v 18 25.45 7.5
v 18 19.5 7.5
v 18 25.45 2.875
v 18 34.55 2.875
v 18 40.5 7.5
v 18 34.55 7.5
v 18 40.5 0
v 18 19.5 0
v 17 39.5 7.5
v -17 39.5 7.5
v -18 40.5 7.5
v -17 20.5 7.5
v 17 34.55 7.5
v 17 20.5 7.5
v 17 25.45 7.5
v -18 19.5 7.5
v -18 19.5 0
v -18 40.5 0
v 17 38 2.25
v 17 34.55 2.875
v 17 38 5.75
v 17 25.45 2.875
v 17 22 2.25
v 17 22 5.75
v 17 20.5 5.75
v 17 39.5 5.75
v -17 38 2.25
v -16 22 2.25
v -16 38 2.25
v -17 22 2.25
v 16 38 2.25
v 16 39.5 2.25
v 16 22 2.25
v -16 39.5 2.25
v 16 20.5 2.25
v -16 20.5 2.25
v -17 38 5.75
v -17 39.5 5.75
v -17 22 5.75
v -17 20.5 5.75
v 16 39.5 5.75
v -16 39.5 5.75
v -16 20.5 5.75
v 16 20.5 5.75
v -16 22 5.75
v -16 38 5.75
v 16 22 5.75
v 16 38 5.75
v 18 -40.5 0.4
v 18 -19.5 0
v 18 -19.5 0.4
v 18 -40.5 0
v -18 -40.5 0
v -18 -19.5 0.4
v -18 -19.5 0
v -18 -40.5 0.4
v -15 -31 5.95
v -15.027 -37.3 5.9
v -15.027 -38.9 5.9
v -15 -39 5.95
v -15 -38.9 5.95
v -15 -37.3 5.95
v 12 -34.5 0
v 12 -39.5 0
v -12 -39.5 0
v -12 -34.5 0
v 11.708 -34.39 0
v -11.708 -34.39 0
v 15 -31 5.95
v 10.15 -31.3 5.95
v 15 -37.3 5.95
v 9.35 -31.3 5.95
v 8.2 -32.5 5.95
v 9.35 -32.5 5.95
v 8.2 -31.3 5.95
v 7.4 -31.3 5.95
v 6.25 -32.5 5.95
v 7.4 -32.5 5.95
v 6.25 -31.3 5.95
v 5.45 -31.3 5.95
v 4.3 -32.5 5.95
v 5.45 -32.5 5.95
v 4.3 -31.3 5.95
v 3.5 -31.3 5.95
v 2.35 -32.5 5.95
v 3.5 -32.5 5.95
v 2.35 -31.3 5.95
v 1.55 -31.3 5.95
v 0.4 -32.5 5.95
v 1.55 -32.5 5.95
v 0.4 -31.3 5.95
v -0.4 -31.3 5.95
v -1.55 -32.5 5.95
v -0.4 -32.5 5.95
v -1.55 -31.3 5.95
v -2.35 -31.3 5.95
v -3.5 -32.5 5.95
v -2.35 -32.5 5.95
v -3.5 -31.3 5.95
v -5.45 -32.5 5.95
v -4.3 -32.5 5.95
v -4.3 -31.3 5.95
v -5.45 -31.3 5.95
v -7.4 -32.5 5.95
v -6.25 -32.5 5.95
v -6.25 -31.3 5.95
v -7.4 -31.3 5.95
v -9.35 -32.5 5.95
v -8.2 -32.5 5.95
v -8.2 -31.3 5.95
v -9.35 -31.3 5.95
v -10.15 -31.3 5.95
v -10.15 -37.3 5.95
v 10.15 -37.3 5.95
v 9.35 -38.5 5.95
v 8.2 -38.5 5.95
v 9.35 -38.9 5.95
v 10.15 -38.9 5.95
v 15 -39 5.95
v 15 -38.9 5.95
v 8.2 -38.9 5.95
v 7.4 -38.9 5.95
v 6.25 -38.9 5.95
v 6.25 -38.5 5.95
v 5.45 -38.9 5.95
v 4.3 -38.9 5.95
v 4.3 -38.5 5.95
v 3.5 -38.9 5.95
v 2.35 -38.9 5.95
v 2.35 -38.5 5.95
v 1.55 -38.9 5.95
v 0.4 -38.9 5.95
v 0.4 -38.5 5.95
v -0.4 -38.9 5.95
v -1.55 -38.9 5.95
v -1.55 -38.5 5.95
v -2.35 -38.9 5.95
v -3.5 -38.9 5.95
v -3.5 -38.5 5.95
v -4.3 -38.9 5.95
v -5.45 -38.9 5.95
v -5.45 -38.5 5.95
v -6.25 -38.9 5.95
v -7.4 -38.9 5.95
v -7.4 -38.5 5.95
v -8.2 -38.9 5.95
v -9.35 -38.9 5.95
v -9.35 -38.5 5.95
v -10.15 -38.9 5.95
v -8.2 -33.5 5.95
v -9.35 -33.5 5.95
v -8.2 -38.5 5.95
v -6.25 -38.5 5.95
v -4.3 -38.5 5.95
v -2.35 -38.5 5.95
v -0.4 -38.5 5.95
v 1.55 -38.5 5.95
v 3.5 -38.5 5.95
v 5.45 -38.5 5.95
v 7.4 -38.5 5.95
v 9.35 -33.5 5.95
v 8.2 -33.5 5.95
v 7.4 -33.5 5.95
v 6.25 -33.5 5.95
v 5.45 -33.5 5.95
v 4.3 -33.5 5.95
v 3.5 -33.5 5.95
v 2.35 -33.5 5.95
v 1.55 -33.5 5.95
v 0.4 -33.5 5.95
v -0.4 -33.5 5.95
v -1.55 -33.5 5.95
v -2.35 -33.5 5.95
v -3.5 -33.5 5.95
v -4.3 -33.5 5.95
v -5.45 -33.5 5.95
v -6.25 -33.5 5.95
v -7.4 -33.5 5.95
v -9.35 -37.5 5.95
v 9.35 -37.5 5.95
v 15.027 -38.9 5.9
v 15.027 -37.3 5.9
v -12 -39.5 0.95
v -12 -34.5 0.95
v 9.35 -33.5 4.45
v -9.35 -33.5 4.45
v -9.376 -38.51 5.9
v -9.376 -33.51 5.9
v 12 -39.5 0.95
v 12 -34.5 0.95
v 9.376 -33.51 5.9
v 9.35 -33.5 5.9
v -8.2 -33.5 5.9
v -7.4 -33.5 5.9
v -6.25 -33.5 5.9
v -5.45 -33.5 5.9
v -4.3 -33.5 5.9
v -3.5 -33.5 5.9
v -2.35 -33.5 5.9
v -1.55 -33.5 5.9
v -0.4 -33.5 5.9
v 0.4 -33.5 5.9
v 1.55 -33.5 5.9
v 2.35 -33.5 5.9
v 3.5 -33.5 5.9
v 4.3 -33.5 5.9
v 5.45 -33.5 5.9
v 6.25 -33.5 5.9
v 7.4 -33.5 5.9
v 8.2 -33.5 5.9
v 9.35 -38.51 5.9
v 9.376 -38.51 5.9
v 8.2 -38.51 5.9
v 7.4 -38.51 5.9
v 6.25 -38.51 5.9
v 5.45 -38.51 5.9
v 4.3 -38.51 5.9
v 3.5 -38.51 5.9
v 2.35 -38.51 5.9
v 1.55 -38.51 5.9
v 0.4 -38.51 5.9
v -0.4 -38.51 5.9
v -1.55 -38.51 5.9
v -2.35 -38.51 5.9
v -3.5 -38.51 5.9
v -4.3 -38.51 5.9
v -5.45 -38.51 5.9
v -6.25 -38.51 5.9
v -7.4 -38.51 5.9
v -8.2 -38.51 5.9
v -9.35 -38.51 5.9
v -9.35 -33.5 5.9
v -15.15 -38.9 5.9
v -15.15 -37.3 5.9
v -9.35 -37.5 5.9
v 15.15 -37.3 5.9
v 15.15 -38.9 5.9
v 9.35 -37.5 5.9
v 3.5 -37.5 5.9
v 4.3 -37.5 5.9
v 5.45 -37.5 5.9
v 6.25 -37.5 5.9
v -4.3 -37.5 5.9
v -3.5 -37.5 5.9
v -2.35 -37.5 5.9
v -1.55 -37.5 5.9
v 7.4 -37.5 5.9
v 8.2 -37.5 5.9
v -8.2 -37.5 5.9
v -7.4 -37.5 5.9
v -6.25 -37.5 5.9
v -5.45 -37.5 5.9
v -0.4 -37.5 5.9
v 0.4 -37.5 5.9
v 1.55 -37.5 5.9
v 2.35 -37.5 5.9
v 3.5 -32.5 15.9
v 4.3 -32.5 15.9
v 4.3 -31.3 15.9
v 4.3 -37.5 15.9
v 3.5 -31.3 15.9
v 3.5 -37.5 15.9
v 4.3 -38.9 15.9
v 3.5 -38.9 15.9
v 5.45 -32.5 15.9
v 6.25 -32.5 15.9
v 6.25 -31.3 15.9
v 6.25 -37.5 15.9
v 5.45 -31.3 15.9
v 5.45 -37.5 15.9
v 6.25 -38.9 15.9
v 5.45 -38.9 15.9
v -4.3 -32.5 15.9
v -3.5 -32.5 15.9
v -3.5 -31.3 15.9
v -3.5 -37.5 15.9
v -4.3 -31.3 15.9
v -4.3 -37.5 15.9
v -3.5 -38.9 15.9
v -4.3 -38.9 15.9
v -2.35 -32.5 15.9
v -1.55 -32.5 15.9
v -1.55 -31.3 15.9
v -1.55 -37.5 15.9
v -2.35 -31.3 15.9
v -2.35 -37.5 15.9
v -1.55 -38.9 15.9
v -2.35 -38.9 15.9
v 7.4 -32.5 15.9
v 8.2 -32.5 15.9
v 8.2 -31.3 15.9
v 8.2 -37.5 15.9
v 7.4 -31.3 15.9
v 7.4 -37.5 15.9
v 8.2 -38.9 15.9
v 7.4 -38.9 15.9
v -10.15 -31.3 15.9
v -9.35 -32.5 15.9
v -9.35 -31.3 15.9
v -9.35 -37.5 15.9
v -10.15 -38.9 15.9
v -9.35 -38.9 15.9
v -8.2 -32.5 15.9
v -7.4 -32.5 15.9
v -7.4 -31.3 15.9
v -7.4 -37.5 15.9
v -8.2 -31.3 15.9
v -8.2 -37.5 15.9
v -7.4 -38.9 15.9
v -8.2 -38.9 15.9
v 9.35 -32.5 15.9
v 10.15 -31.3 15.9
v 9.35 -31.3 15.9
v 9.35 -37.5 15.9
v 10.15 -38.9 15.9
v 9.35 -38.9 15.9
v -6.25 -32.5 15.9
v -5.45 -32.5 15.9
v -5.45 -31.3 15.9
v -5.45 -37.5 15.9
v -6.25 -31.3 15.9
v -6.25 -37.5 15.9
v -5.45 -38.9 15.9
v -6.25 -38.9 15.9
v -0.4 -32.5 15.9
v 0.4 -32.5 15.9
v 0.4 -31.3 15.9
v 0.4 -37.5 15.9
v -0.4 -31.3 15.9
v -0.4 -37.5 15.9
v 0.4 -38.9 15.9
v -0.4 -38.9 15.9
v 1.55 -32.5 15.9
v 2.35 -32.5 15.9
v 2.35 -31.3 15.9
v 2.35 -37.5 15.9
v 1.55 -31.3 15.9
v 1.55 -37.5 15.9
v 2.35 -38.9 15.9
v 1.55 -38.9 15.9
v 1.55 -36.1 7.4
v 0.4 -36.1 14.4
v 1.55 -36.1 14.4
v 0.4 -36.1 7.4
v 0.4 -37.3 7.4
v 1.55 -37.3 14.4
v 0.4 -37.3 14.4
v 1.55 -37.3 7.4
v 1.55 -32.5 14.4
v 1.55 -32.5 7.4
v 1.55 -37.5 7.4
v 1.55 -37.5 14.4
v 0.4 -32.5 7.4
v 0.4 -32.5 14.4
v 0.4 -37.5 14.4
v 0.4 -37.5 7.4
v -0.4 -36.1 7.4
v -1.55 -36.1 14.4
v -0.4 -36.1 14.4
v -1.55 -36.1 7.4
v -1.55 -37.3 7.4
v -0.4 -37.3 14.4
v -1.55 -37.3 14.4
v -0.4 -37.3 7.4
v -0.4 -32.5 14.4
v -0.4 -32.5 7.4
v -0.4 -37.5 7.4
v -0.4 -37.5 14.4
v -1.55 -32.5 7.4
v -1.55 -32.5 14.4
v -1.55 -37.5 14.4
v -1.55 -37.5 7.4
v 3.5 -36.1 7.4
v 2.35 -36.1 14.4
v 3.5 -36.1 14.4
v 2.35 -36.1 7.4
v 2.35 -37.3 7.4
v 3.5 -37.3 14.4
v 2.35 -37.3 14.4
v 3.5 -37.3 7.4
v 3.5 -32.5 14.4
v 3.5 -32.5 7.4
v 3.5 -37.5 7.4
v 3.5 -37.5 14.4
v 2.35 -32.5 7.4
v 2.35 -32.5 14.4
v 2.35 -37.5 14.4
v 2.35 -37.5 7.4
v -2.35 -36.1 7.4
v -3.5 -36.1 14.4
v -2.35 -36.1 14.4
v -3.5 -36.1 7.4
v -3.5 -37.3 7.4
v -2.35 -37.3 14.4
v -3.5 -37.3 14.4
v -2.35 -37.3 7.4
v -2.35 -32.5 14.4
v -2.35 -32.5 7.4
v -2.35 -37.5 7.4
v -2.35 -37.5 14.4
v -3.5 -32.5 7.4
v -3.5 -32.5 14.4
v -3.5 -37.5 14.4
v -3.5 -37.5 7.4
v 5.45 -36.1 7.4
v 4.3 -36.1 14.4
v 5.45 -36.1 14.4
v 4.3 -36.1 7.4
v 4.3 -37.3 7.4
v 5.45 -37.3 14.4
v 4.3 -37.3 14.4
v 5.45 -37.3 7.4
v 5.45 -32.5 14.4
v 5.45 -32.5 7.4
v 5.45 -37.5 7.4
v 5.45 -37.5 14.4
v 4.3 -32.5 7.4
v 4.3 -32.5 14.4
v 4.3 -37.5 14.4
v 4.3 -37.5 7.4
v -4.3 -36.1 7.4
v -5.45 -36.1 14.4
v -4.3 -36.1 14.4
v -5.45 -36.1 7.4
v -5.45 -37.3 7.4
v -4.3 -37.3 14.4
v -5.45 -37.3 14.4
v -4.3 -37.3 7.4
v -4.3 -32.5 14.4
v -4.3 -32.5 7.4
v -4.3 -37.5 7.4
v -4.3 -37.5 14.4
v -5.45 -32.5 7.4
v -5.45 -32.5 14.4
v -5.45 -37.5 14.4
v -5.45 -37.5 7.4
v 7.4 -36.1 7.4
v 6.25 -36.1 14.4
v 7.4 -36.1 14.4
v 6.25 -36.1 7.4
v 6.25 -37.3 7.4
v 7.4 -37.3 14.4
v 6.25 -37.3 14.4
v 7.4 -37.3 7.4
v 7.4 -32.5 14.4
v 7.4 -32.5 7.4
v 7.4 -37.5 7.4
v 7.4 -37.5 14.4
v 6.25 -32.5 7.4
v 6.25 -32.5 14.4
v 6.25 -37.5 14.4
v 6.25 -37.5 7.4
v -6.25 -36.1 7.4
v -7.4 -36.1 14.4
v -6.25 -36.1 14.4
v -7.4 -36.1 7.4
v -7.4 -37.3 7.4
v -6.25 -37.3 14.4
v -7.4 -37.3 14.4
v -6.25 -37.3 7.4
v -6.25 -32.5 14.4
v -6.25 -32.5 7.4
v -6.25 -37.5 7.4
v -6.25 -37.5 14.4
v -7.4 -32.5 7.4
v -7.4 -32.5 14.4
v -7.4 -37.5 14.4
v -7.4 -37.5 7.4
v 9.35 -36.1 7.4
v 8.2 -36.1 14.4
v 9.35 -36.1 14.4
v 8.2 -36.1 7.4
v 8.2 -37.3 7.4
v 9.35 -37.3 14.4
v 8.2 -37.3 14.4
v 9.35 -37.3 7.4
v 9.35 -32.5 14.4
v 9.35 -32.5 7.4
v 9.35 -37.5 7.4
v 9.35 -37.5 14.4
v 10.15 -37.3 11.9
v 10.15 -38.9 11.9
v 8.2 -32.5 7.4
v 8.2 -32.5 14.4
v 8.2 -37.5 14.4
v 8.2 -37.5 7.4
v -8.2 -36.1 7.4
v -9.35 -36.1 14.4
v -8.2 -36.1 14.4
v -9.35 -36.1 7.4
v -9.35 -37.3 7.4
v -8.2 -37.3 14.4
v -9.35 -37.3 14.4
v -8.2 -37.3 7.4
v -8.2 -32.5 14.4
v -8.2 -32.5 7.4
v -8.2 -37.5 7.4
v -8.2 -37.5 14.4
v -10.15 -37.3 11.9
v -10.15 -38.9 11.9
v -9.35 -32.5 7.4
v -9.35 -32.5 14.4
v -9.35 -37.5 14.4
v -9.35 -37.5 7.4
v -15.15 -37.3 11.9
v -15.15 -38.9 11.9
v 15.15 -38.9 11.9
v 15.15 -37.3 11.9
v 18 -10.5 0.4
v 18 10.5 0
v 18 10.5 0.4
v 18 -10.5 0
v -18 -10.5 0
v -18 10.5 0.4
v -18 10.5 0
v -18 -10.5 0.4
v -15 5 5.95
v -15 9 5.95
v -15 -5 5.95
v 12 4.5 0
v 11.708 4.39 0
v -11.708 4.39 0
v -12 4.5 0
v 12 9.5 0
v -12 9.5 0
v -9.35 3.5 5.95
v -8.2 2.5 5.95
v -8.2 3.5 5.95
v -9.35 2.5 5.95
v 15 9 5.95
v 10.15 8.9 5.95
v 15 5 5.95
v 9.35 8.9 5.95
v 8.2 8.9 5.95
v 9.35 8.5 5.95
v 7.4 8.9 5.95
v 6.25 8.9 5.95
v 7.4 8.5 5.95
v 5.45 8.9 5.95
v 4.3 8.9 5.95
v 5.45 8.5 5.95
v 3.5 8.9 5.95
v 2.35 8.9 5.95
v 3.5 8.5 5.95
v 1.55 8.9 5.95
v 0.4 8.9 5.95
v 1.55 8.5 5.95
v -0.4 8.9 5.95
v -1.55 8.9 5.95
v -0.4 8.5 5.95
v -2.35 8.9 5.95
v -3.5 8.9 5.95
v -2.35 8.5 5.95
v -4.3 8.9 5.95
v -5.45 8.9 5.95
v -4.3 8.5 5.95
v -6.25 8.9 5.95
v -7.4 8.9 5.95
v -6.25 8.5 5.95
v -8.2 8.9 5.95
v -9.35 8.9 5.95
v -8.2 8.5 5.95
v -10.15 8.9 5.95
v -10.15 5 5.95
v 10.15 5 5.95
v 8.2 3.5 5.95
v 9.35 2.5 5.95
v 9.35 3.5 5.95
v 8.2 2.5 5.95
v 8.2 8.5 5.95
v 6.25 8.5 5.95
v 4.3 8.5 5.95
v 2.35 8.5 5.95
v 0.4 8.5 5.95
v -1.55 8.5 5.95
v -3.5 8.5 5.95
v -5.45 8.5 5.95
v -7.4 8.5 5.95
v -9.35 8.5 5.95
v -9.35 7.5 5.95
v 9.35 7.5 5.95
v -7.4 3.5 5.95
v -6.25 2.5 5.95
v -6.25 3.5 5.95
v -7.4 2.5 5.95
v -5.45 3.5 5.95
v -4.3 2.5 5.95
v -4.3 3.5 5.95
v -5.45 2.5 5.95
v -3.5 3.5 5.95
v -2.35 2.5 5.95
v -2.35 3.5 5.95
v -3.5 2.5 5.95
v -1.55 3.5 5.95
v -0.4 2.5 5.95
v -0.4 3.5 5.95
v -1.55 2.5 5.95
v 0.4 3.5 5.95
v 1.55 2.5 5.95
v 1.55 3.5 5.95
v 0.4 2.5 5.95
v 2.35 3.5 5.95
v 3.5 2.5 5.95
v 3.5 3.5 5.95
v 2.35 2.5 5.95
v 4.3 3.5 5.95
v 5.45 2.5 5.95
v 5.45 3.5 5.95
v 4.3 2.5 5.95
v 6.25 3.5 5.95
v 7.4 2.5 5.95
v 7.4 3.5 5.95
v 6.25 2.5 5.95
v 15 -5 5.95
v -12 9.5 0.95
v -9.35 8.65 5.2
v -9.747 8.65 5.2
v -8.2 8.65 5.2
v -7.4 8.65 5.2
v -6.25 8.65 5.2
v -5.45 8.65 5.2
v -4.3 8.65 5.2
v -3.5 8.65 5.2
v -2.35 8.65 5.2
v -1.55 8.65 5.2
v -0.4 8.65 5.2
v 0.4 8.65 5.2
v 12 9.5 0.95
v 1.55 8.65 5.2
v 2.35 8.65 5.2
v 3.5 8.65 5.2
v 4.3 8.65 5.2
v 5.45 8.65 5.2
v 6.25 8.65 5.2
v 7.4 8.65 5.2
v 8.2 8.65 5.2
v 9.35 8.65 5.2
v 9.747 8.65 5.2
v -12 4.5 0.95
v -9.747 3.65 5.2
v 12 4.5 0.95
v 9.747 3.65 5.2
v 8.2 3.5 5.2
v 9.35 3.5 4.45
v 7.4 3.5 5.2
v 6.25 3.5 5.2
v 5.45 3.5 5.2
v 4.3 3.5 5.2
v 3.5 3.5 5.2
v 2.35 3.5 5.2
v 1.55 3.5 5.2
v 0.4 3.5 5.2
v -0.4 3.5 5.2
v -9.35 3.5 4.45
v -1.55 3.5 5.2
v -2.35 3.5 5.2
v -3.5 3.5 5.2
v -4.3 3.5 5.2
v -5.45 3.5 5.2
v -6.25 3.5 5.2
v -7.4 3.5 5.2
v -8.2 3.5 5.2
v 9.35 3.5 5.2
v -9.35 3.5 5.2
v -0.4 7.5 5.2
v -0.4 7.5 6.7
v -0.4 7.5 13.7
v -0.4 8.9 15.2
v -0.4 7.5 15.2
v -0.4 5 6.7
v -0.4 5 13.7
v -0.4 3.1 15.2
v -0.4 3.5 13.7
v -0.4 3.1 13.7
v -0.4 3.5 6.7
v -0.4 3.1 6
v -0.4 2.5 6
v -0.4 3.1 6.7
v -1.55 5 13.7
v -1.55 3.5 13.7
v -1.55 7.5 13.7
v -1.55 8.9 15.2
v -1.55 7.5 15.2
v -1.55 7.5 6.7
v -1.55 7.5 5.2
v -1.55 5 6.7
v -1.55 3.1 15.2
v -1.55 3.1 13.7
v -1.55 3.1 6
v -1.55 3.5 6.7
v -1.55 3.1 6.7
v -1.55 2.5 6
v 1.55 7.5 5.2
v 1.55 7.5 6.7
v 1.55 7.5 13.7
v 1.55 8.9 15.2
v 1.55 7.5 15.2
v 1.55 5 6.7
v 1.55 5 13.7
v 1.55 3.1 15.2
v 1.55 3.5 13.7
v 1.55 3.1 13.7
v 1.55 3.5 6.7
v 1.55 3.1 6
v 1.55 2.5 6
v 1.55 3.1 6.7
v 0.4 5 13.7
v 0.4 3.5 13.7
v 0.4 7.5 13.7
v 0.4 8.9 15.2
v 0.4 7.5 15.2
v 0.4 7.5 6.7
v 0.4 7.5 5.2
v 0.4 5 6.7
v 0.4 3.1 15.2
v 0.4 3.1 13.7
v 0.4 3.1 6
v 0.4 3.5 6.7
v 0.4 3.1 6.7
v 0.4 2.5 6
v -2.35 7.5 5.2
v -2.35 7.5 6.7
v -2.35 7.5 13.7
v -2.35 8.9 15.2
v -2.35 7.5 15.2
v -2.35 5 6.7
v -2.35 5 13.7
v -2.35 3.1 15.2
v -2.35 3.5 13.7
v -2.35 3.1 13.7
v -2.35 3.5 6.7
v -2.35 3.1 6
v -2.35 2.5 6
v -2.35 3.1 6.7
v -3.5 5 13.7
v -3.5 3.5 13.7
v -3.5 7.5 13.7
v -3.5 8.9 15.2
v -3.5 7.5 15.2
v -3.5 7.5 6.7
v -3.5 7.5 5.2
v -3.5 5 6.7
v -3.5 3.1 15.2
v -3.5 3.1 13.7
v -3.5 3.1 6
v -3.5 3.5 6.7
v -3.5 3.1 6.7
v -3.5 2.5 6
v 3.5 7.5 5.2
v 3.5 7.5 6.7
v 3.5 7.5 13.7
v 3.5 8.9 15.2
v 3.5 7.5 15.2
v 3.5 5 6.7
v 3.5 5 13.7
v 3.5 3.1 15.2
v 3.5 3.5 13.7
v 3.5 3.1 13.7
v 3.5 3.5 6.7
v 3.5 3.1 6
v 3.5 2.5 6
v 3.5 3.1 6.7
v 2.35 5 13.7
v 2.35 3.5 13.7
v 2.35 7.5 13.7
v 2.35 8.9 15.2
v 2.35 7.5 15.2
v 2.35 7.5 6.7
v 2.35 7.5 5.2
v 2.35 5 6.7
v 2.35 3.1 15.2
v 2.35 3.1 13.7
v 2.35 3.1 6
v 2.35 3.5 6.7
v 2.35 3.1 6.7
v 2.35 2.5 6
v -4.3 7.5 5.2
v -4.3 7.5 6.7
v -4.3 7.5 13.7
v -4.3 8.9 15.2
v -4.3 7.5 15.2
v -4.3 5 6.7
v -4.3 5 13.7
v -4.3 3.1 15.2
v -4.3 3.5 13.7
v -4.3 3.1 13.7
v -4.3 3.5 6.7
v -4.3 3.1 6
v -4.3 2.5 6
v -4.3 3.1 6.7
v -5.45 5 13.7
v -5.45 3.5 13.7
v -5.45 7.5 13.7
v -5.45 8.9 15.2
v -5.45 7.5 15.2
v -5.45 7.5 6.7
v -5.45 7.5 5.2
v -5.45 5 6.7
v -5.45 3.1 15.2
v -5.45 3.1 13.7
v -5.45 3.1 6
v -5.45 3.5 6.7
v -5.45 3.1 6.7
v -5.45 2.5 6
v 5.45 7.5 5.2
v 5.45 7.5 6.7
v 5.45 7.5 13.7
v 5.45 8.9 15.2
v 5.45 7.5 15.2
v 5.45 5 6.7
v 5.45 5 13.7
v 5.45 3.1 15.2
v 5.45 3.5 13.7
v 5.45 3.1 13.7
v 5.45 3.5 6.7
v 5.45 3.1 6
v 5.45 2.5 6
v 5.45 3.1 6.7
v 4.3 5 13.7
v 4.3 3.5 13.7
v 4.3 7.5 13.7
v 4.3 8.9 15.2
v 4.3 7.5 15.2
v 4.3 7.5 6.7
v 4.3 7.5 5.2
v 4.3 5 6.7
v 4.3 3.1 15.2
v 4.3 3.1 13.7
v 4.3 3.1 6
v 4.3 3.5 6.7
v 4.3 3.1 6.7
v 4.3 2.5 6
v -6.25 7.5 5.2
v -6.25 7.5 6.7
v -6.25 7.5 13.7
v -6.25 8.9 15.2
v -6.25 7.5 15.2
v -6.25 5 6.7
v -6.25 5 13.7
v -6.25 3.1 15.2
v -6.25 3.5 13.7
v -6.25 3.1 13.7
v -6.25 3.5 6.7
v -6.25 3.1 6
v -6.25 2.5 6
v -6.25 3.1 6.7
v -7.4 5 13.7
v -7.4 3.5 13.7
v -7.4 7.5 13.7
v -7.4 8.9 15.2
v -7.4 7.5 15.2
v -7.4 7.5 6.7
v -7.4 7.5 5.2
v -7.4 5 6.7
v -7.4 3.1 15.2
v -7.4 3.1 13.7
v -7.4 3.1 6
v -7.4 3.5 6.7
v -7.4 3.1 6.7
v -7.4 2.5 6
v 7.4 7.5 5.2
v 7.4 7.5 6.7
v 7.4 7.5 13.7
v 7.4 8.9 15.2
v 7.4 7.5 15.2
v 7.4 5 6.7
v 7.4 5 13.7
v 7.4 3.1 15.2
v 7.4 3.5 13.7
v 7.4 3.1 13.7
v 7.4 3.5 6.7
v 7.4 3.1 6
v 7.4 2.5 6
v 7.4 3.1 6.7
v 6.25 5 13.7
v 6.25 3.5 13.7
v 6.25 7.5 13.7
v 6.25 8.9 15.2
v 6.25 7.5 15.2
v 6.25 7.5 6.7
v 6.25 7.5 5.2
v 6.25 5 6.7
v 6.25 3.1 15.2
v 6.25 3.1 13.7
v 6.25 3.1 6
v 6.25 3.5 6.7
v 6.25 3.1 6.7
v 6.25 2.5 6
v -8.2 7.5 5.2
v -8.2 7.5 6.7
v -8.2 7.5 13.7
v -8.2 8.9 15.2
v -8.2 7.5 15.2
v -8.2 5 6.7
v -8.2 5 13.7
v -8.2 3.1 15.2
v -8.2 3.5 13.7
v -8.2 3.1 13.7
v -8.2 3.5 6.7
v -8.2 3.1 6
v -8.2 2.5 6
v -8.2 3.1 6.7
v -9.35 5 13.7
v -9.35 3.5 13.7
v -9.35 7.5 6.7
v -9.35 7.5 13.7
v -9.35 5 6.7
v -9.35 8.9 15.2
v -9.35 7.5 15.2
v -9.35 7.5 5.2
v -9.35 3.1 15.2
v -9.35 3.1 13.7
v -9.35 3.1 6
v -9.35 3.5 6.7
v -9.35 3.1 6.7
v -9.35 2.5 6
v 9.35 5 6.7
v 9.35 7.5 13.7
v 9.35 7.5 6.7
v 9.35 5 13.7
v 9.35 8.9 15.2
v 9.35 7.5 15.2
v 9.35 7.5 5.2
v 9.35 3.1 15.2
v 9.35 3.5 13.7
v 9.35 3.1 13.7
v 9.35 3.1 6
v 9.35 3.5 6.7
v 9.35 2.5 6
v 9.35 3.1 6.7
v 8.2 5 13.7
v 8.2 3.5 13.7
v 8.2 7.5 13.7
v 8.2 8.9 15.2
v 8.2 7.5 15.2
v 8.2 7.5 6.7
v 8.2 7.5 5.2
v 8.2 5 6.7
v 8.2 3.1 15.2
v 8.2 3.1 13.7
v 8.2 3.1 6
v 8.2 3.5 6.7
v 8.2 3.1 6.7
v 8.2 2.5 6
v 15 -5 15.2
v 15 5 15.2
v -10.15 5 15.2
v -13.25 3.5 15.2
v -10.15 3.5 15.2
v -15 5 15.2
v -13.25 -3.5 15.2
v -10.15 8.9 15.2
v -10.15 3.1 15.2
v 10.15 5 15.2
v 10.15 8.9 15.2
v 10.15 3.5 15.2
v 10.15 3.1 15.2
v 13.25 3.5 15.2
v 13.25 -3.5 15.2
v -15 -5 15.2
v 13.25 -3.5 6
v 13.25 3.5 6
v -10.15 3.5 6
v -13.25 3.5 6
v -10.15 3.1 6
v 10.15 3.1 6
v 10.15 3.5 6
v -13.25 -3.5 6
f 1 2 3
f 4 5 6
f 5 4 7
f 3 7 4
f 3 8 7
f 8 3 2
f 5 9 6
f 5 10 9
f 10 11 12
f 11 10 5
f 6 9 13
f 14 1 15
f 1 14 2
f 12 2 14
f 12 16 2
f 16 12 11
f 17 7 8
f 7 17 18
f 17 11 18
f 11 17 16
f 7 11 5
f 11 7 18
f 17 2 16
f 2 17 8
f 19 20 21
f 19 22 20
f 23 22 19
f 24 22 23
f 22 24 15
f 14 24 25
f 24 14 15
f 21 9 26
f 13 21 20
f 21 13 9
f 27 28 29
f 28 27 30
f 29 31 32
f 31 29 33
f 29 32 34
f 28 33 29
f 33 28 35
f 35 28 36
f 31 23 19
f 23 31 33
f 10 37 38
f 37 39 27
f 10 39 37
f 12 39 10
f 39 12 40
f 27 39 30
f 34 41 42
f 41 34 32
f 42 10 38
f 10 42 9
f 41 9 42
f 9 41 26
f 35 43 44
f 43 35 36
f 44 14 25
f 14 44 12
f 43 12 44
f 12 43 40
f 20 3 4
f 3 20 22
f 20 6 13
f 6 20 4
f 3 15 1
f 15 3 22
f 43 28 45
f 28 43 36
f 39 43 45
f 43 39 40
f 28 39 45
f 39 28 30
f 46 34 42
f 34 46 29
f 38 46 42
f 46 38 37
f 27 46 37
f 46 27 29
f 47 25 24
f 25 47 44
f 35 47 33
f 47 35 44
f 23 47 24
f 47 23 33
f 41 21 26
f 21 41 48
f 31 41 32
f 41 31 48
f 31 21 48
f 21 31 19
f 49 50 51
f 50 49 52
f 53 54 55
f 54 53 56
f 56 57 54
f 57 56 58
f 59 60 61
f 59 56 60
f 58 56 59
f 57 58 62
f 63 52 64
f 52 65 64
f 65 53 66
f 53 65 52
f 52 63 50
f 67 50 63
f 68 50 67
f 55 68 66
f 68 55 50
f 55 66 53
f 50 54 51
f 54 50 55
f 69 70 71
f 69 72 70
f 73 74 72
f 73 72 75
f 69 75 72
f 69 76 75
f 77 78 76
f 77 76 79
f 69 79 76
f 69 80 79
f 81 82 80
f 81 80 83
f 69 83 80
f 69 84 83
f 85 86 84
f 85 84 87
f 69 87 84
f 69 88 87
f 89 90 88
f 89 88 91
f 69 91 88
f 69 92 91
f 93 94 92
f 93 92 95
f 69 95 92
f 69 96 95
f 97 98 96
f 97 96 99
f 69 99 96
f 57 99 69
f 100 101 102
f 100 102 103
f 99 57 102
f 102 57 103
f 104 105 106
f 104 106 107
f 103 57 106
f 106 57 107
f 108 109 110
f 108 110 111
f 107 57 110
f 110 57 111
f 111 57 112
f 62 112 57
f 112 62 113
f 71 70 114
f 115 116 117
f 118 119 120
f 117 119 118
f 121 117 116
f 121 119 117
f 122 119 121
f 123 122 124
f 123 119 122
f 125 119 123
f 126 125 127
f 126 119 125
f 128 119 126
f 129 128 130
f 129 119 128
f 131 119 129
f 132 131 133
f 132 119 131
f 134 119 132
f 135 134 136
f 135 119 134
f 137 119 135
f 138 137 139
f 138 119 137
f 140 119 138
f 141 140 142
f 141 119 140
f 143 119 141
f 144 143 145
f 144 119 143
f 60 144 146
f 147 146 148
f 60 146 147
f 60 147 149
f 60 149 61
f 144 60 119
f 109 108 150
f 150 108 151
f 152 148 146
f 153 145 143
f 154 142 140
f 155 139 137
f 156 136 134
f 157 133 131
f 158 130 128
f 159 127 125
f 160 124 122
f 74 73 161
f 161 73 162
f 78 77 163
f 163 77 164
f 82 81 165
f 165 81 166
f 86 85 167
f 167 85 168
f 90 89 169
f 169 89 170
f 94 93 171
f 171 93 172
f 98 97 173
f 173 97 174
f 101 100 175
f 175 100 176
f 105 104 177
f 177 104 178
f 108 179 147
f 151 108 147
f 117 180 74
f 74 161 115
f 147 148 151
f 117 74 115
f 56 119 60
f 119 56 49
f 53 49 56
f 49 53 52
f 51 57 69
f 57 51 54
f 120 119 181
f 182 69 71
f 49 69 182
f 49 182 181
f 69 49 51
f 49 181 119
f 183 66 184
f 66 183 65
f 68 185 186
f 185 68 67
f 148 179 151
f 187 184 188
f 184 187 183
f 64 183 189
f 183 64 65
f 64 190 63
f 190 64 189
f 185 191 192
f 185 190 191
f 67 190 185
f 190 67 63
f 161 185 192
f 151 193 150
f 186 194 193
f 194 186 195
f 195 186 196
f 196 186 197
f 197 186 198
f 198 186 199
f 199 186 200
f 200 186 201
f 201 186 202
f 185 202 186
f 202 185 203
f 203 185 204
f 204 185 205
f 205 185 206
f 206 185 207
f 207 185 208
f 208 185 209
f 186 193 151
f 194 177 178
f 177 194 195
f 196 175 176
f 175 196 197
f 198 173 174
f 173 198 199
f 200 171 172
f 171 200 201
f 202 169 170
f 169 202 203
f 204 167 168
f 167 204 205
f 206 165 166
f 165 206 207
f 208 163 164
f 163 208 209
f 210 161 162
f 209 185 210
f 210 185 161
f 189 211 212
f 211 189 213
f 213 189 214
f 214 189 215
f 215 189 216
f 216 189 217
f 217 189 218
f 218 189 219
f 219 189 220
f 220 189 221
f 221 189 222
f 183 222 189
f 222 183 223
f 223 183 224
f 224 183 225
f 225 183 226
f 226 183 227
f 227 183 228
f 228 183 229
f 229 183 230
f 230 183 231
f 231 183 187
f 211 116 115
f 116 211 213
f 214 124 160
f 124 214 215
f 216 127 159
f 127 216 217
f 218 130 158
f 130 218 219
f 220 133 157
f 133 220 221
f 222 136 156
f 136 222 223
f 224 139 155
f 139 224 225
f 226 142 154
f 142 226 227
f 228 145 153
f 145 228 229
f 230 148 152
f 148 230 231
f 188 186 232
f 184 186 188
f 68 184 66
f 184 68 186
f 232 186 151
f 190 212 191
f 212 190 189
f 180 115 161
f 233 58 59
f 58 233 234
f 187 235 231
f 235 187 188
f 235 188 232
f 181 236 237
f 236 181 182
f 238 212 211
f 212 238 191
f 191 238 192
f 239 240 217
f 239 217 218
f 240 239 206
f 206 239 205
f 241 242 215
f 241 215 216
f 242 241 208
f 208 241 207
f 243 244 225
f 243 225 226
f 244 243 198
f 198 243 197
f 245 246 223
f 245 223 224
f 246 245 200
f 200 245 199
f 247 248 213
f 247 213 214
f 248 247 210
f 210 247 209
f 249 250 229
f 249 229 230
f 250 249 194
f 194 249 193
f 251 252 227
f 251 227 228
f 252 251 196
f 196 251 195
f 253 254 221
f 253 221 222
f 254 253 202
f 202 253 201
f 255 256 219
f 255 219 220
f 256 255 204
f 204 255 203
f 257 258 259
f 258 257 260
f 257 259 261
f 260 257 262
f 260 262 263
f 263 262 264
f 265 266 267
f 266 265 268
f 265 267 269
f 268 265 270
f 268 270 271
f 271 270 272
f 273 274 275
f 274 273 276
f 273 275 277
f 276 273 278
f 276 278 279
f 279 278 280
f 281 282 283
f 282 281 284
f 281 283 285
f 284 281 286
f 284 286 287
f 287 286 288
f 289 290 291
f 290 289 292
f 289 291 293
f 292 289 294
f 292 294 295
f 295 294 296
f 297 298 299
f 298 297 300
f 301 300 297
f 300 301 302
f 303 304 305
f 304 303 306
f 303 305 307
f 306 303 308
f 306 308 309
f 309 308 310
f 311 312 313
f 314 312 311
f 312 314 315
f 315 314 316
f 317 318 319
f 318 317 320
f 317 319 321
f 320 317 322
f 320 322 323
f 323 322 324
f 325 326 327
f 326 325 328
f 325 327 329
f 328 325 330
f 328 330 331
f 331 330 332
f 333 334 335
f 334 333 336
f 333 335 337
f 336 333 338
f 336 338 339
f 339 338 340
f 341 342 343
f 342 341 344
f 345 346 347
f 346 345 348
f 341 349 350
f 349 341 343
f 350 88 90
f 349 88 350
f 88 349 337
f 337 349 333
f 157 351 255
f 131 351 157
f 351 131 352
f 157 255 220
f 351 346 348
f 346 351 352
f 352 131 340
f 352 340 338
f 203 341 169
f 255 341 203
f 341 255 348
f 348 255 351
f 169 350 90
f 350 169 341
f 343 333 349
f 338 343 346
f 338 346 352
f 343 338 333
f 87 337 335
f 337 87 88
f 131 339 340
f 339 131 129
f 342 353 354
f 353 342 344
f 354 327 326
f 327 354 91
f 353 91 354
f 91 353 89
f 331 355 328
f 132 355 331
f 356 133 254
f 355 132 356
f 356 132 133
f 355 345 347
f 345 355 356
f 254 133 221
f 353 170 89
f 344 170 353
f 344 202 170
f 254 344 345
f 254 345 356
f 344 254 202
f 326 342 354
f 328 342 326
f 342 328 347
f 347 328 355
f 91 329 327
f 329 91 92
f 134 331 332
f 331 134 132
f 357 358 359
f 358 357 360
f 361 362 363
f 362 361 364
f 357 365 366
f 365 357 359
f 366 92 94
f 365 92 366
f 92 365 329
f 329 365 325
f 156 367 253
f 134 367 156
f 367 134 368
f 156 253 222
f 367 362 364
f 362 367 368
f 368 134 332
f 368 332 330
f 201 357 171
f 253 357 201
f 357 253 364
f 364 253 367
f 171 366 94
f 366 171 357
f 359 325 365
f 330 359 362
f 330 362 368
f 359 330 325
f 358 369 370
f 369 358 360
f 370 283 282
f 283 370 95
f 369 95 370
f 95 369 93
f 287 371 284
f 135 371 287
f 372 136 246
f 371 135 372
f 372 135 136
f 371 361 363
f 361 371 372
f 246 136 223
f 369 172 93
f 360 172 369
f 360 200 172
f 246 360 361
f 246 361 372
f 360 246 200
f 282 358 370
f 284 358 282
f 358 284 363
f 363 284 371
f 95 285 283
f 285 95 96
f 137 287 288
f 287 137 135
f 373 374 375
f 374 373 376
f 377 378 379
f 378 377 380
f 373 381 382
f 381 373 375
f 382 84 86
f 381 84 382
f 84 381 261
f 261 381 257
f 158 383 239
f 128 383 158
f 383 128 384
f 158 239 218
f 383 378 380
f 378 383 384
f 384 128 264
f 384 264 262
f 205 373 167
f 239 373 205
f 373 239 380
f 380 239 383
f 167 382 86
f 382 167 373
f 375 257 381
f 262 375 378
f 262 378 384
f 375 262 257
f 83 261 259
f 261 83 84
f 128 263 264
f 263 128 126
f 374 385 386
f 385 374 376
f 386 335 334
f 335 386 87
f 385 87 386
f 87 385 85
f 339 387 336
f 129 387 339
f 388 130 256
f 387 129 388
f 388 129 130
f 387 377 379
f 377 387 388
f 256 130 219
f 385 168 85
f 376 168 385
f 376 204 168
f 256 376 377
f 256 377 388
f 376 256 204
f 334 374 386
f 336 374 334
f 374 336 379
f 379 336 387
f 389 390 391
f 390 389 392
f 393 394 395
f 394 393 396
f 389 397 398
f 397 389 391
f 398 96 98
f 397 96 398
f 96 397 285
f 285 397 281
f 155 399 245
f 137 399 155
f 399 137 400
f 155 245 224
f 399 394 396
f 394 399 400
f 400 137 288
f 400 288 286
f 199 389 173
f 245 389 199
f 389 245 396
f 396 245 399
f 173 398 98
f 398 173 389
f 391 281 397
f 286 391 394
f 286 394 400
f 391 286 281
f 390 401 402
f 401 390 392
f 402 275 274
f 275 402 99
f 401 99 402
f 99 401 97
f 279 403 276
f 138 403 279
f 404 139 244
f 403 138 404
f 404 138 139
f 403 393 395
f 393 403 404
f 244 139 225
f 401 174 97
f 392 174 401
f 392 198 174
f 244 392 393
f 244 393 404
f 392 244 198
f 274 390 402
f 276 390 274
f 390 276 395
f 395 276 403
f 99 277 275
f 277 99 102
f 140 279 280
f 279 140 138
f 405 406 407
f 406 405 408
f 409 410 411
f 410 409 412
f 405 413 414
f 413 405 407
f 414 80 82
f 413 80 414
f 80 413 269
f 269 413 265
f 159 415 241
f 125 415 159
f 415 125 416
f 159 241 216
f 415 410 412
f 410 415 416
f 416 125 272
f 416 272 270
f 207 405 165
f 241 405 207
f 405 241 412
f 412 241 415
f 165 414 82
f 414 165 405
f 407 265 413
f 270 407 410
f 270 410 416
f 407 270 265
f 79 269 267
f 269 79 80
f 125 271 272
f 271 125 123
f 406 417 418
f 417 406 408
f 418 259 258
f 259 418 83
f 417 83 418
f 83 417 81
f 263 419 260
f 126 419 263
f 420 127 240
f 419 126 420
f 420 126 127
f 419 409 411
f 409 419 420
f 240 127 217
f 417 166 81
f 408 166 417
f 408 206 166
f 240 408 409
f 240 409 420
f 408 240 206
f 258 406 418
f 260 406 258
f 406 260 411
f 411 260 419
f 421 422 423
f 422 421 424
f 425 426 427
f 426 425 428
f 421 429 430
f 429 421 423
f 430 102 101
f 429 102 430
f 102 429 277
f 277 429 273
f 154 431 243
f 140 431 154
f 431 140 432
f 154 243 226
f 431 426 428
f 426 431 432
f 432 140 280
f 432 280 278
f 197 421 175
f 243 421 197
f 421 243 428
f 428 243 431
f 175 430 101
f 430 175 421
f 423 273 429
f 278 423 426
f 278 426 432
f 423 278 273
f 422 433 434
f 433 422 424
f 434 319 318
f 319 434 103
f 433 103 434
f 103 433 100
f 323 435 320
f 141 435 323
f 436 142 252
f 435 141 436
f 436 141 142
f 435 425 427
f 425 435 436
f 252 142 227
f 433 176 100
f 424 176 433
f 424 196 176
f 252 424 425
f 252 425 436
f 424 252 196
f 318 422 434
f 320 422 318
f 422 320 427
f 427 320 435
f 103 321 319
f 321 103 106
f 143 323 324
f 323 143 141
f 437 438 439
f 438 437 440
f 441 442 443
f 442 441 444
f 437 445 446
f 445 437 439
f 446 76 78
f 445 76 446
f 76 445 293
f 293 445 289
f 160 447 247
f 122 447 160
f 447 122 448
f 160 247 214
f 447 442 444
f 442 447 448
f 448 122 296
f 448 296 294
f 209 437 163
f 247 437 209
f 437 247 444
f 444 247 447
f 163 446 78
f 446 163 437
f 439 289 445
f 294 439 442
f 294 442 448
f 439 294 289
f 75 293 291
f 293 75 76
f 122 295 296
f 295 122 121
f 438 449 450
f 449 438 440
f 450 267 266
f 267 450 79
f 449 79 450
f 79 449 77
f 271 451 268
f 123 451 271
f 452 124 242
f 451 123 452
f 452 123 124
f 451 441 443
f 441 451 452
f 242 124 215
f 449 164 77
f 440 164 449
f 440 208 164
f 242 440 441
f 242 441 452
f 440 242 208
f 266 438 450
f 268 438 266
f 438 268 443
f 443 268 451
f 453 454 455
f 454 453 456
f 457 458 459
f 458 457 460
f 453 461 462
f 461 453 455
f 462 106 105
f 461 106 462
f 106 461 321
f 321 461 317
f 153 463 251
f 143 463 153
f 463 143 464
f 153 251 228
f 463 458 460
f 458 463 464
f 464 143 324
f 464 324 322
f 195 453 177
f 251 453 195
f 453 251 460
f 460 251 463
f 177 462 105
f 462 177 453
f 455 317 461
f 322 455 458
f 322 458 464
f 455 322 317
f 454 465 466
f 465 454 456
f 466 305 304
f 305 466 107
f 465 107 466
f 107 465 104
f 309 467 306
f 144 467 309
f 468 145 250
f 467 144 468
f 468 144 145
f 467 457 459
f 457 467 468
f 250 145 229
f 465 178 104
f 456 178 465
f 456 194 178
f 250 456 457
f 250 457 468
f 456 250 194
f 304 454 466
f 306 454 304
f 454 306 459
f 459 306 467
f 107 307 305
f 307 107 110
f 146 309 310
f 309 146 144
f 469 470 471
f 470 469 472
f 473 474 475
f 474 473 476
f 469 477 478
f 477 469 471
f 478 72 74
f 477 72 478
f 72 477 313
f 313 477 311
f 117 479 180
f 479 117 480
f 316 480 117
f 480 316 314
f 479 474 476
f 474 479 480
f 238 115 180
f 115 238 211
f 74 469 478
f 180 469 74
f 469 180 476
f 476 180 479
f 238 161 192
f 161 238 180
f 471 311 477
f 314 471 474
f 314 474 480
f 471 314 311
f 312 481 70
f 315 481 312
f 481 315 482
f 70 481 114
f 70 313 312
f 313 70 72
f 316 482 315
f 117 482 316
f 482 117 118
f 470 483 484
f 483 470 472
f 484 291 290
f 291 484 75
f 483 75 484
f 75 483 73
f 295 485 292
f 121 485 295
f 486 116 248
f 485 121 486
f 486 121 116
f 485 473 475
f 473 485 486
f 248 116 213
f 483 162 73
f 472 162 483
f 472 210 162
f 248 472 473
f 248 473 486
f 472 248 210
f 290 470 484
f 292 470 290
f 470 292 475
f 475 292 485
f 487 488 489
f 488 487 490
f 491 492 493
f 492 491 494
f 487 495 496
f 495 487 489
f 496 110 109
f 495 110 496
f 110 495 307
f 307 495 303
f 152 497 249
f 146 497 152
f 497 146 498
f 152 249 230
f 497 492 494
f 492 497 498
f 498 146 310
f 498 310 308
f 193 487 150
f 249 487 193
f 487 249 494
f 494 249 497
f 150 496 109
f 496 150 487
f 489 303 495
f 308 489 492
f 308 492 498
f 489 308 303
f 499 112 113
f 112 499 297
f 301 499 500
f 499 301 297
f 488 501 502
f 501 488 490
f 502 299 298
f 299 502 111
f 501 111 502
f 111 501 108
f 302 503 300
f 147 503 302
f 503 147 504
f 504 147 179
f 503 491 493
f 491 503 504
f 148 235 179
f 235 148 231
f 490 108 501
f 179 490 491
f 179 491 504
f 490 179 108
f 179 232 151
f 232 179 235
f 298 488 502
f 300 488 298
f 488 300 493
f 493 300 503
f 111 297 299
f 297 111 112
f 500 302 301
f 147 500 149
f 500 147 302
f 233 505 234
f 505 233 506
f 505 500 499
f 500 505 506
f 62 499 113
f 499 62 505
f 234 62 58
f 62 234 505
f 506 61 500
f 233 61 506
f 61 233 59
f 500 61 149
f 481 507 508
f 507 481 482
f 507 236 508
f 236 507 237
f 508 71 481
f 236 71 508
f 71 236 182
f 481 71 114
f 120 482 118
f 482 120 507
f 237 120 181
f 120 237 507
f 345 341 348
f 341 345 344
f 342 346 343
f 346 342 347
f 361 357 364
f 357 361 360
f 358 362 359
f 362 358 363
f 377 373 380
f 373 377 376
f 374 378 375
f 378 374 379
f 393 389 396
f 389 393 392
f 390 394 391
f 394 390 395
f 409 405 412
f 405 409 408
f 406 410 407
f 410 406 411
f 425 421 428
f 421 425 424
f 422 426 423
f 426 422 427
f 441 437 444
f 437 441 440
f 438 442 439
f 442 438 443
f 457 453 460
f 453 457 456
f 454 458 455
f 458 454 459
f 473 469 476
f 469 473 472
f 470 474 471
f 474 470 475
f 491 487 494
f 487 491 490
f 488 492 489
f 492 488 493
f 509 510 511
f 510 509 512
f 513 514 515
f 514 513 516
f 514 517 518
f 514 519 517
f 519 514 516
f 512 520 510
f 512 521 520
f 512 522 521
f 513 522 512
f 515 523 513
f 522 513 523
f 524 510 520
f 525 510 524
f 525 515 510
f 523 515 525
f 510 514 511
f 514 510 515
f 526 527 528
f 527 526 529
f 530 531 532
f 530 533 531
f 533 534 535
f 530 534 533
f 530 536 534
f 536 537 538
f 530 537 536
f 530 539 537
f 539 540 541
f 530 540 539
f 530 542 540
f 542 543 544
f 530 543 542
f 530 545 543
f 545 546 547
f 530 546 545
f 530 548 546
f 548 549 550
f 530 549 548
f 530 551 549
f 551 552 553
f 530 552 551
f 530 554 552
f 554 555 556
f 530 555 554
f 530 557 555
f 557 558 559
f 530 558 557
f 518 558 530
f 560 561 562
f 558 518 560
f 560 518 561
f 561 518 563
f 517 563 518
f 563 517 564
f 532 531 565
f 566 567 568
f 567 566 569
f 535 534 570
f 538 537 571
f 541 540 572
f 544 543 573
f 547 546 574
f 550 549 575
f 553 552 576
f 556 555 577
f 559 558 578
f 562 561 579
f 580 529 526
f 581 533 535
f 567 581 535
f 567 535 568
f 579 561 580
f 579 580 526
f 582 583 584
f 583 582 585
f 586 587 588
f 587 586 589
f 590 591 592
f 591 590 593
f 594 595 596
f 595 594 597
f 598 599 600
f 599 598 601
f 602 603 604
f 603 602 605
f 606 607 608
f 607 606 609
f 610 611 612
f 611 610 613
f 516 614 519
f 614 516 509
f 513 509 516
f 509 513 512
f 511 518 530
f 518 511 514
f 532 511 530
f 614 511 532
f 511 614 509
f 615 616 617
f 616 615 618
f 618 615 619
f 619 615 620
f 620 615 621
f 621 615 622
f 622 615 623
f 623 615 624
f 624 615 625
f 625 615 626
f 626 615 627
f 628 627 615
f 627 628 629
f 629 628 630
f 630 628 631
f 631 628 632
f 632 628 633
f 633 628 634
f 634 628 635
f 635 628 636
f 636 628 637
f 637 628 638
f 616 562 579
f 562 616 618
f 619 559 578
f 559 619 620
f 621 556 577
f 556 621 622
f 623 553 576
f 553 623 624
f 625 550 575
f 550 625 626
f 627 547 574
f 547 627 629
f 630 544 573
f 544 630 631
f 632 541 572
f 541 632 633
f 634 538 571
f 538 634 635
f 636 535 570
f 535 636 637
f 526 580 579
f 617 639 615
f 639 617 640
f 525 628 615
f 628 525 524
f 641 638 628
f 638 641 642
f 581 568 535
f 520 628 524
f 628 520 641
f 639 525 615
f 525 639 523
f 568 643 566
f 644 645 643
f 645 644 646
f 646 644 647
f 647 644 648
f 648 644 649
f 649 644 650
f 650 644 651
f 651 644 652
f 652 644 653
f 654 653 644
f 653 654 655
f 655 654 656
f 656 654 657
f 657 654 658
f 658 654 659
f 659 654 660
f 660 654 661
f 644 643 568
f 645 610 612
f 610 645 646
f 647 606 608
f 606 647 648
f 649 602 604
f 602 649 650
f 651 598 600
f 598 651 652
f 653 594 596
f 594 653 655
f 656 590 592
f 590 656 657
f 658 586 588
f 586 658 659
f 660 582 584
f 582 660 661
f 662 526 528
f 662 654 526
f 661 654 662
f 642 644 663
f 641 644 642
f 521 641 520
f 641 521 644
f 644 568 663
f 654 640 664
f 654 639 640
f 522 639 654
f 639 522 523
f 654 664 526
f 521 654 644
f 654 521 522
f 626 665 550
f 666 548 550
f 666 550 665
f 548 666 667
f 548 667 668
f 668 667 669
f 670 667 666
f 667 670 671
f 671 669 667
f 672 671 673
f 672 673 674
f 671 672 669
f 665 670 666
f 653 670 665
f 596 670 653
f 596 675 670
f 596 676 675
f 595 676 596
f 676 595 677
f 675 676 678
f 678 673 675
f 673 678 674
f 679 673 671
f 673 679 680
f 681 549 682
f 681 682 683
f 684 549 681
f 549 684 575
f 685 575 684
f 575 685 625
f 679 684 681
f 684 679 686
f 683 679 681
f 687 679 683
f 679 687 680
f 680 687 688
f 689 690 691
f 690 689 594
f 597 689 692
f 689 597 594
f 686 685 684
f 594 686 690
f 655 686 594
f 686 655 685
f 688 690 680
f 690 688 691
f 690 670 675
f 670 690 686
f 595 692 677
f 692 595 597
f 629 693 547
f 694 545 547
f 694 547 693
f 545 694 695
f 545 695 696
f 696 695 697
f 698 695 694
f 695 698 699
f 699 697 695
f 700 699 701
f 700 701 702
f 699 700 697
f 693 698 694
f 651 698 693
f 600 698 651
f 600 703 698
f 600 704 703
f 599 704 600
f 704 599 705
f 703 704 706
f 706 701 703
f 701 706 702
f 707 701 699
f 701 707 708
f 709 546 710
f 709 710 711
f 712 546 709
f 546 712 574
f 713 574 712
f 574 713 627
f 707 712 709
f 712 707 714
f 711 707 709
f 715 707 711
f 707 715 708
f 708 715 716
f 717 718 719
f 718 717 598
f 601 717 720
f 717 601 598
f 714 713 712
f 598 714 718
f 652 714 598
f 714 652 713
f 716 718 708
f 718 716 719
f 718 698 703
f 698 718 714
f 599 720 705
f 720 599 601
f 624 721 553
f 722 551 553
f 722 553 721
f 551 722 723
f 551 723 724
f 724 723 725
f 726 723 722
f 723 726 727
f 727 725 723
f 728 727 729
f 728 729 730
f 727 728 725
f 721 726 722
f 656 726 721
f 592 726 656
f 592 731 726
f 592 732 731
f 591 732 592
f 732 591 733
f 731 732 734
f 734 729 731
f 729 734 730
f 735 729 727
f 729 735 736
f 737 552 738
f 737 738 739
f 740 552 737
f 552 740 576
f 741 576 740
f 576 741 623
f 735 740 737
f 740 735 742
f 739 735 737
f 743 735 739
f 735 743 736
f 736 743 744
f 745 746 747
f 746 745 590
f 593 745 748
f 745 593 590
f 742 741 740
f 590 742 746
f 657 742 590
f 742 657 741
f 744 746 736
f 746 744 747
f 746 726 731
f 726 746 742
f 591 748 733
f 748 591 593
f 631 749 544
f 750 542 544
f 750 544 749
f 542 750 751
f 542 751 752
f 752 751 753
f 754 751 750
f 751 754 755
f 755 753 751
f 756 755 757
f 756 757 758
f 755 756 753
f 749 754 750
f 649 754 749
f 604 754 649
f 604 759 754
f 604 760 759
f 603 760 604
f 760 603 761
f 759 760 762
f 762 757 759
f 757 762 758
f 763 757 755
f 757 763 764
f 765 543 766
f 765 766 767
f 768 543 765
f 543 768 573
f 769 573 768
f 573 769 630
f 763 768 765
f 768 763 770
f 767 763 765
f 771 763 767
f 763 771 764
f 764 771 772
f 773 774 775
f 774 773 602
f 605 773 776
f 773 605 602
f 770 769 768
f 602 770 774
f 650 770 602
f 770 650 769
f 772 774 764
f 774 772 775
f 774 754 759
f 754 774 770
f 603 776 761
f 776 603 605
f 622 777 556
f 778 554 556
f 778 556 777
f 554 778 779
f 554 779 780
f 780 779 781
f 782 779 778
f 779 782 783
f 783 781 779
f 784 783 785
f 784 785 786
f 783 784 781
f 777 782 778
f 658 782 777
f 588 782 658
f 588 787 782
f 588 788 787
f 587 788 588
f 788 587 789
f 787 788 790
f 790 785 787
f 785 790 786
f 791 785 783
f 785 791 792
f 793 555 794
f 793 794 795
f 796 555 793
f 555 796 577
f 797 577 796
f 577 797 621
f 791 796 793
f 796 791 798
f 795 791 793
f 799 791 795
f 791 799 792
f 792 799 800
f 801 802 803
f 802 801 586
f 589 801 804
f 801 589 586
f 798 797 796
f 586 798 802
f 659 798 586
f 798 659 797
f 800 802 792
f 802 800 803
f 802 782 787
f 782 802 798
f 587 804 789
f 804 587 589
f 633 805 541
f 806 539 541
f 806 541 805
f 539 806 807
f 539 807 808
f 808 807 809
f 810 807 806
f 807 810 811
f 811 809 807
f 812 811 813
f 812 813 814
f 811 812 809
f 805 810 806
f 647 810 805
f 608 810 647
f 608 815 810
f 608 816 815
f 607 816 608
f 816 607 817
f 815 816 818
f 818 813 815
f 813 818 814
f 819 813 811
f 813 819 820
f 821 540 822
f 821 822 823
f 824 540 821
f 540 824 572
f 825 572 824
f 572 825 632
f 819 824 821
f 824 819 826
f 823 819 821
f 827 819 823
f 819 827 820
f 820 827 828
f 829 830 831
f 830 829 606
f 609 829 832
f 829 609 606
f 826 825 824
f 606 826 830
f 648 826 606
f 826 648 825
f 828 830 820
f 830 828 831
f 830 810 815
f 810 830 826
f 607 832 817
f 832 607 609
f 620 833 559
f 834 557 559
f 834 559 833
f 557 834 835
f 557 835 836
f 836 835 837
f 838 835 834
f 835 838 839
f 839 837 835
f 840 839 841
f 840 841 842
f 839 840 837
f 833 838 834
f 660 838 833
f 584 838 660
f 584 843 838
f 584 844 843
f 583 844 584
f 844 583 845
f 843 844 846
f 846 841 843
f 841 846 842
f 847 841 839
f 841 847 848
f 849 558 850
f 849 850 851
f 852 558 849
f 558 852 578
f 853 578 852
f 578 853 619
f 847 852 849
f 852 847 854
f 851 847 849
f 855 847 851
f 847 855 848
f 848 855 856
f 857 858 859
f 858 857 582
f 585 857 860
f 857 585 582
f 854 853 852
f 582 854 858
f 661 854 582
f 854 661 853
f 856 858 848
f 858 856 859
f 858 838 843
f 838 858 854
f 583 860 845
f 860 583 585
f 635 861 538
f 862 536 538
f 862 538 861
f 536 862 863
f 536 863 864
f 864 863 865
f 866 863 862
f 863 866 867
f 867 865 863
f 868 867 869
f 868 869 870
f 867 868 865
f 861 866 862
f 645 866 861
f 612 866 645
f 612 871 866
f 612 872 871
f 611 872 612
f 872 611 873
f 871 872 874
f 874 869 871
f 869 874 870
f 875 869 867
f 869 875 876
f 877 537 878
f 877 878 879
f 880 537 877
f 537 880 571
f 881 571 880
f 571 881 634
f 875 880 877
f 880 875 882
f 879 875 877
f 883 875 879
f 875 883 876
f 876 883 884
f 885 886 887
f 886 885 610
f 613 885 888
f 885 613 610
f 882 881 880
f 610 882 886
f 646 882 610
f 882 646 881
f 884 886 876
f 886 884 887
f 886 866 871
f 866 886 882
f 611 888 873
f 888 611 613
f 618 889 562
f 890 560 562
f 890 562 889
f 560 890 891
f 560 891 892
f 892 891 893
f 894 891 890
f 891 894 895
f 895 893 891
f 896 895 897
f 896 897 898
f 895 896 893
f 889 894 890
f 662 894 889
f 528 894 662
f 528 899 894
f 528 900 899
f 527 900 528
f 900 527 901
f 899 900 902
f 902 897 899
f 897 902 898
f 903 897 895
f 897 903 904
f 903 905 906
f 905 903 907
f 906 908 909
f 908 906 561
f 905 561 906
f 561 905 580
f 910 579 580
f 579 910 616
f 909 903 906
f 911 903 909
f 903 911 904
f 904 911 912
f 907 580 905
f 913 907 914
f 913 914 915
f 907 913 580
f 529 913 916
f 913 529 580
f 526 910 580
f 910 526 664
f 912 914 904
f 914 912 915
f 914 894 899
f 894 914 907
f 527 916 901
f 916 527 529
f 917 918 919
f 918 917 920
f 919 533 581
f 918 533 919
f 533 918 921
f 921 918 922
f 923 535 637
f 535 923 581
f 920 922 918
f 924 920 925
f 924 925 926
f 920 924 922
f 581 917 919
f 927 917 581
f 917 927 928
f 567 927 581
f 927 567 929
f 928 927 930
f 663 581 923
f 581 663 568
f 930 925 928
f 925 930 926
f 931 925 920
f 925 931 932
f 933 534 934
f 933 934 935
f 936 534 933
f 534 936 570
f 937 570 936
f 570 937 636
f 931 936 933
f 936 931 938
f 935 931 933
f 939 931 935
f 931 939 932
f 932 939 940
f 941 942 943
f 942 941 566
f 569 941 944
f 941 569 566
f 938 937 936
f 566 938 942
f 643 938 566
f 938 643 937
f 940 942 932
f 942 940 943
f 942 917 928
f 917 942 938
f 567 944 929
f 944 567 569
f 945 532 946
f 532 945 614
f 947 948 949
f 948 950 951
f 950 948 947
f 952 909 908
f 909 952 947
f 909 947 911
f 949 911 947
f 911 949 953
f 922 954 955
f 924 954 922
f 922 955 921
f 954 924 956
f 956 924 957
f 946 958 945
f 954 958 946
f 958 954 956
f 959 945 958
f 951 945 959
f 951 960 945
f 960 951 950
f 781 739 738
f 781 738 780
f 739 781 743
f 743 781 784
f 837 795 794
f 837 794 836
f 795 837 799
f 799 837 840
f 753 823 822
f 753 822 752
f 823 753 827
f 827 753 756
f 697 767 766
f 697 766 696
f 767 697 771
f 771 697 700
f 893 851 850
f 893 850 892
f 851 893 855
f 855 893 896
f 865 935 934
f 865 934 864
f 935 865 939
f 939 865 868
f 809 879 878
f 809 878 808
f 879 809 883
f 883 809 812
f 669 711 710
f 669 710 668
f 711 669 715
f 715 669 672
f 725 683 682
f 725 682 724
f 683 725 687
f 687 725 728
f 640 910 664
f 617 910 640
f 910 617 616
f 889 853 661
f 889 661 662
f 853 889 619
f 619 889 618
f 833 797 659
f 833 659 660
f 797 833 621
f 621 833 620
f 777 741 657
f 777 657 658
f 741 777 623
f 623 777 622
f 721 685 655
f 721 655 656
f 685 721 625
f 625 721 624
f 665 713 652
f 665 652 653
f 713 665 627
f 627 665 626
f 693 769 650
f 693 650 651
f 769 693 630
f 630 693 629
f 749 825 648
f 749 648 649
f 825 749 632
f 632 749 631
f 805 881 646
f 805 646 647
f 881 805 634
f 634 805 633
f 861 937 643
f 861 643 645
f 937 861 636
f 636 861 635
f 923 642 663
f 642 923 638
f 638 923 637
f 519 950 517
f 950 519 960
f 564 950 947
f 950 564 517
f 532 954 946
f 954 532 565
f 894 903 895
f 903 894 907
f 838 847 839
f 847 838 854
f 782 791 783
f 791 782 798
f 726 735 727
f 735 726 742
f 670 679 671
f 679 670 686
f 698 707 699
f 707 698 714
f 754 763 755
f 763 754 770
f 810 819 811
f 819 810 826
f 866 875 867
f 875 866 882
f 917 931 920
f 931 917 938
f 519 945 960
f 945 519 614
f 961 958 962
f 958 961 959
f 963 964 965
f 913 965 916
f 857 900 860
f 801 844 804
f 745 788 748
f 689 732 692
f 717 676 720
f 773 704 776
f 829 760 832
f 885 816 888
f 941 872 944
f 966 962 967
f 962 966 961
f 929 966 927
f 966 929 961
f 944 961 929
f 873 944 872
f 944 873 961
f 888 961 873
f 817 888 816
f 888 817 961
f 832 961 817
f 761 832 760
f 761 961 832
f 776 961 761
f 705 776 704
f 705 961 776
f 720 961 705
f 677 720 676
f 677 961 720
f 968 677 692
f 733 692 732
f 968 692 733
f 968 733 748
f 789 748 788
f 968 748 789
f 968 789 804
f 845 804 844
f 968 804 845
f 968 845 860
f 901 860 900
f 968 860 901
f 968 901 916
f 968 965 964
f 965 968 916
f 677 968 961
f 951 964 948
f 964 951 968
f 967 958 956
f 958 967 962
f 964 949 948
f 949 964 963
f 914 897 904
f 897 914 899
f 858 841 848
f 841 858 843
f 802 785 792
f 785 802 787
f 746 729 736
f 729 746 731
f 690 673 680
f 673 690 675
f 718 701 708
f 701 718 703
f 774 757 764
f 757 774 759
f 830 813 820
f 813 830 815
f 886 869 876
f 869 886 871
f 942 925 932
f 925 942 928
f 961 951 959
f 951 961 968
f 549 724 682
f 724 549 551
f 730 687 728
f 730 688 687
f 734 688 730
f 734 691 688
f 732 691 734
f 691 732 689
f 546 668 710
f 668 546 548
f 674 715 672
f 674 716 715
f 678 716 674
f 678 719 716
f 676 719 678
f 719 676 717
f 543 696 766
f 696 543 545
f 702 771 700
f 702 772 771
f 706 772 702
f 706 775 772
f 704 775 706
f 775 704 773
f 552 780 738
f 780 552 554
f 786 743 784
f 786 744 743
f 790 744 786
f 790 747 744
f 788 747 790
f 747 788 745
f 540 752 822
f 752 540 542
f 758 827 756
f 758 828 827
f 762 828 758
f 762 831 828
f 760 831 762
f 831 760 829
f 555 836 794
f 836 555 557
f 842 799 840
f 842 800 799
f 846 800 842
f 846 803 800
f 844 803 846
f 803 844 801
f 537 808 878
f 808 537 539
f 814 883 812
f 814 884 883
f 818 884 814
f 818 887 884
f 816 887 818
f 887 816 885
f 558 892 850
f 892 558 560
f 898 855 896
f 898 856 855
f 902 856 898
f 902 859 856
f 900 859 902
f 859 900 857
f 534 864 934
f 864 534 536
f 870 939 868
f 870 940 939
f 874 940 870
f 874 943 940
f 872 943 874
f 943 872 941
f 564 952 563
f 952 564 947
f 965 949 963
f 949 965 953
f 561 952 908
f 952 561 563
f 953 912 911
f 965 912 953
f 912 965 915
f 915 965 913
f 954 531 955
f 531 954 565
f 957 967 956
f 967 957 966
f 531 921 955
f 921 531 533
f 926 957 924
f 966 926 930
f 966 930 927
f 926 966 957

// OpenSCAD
// file: palm-V-adapter.scad
/*
 * ppk_usb
 *
 * Copyright (C) 2014 cy384
 * All rights reserved.
 *
 * This software may be modified and distributed under the terms
 * of the BSD license. See the LICENSE file for details.
 */

// 3d printable adapter for palm-V era devices

module pin()
{
	translate([-1.95/2, -0.8, 0])
	{
		cube(size = [1.95, 1.20, 10.00], center = false);
	}

	translate([(-1.95/2)-0.4, -2.4, 0])
	{
		cube(size = [0.80, 7.60, 10.00], center = false);
	}

	translate([(+1.95/2)-0.4, -2.4, 0])
	{
		cube(size = [0.80, 7.60, 10.00], center = false);
	}
}

module hole()
{
	translate([0, 5.00, 10.00])
	{
		cube(size = [1.15, 5.00, 3.00], center = true);
	}

	translate([0, 5.00, 0.00])
	{
		cube(size = [1.15, 5.00, 3.00], center = true);
	}
}

module palm_v_adapter()
{
	difference()
	{
		union()
		{
			// space for each pin
			for (i = [0 : 4])
			{
				translate([-((1.95/2)+(1.95*i)), 3.5, 0]) pin();
				translate([(1.95/2)+(1.95*i), 3.5, 0]) pin();
			}

			// ears
			translate ([12.65, 1.90, 7]) cube ([5.0, 1.6, 6], center = true);
			translate ([-12.65, 1.90, 7]) cube ([5.0, 1.6, 6], center = true);
		}

		// make holes for the contacts
		for (i = [0 : 4])
		{
			translate([-((1.95/2)+(1.95*i)), 0, 0]) hole();
			translate([(1.95/2)+(1.95*i), 0, 0]) hole();
		}
	}
}

palm_v_adapter();
// file: palm-III-adapter.scad
/*
 * ppk_usb
 *
 * Copyright (C) 2014 cy384
 * All rights reserved.
 *
 * This software may be modified and distributed under the terms
 * of the BSD license. See the LICENSE file for details.
 */

// 3d printable adapter for palm-III era devices

module main_hull()
{
	cube(size = [30.00, 10.00, 10.00], center = true);
}

module socket()
{
	translate ([0, 0, 3.30])
	{
		cube(size = [26.50, 7.00, 15.00], center = true);
	};
}

module pin()
{
	translate([-1.95/2, 0, 0])
	{
		cube(size = [1.95, 1.00, 10.00], center = false);
	}

	translate([(-1.95/2)-0.4, -0.40, 0])
	{
		cube(size = [0.80, 5.80, 10.00], center = false);
	}

	translate([(+1.95/2)-0.4, -0.40, 0])
	{
		cube(size = [0.80, 5.80, 10.00], center = false);
	}
}

module hole()
{
	translate([0, 5.00, 10.00])
	{
		cube(size = [1.15, 5.00, 3.00], center = true);
	}

	translate([0, 5.00, 0.00])
	{
		cube(size = [1.15, 5.00, 3.00], center = true);
	}
}

module palm_iii_adapter()
{
	difference()
	{
		union()
		{
			// main body
			translate([0, 0, 5.00]) difference()
			{
				main_hull();
				socket();
			}

			// space for each pin
			for (i = [0 : 4])
			{
				translate([-((1.95/2)+(1.95*i)), 3.5, 0]) pin();
				translate([(1.95/2)+(1.95*i), 3.5, 0]) pin();
			}
		}

		// make holes for the contacts
		for (i = [0 : 4])
		{
			translate([-((1.95/2)+(1.95*i)), 0, 0]) hole();
			translate([(1.95/2)+(1.95*i), 0, 0]) hole();
		}
	}
}

palm_iii_adapter();
// main file
/*
 * ppk_usb
 *
 * Copyright (C) 2014 cy384
 * All rights reserved.
 *
 * This software may be modified and distributed under the terms
 * of the BSD license. See the LICENSE file for details.
 */

// 3d printable adapter for the pro micro board

use <palm-III-adapter.scad>
use <palm-V-adapter.scad>

module pro_micro_bottom()
{
	union()
	{
		difference()
		{
			cube([36, 21, 7.5], center=true);
			translate([0, 0, 1.5]) { cube([34, 19, 6], center=true); };
			translate([17, 0, 1.5]) { cube([6, 9.1, 4.75], center=true); };
		}
		
		for (i = [-1, 1], j = [-1, 1])
		{
			translate([i*17, j*9, 0]) { cube([2, 2, 4], center=true); };
		}
	}
}

module pro_micro_top_v()
{
	union()
	{
		difference()
		{
			hull()
			{
				translate([0, 10, 0]) { cube([36, 21, 0.4], center=true); };
				translate([0, 5, 5]) { cube([30, 8, 1.5], center=true); };
			}
		
			hull()
			{
				translate([0, 3, 0]) { cube([24, 5, 1.5], center=true); };
				translate([0, 4, 5]) { cube([18.7, 5, 1.5], center=true); };
			}
		}

		translate([0, 0, 15.7]) { rotate([180, 0, 180]) { palm_v_adapter(); }; };
	}
}

module pro_micro_top_iii()
{
	union()
	{
		difference()
		{
			hull()
			{
				cube([36, 21, 0.4], center=true);
				translate([0, 2, 5]) { cube([30, 14, 1.5], center=true); };
			}
		
			hull()
			{
				translate([0, 7, 0]) { cube([24, 5, 1.5], center=true); };
				translate([0, 6, 5]) { cube([18.7, 5, 1.5], center=true); };
			}
		}

		translate([0, 0, 5]) { palm_iii_adapter(); };
	}
}

translate([0, 30, 3.75]) { pro_micro_bottom(); };

translate([0, -40, 0.2]) { pro_micro_top_v(); };

translate([0, 0, 0.2]) { pro_micro_top_iii(); };
